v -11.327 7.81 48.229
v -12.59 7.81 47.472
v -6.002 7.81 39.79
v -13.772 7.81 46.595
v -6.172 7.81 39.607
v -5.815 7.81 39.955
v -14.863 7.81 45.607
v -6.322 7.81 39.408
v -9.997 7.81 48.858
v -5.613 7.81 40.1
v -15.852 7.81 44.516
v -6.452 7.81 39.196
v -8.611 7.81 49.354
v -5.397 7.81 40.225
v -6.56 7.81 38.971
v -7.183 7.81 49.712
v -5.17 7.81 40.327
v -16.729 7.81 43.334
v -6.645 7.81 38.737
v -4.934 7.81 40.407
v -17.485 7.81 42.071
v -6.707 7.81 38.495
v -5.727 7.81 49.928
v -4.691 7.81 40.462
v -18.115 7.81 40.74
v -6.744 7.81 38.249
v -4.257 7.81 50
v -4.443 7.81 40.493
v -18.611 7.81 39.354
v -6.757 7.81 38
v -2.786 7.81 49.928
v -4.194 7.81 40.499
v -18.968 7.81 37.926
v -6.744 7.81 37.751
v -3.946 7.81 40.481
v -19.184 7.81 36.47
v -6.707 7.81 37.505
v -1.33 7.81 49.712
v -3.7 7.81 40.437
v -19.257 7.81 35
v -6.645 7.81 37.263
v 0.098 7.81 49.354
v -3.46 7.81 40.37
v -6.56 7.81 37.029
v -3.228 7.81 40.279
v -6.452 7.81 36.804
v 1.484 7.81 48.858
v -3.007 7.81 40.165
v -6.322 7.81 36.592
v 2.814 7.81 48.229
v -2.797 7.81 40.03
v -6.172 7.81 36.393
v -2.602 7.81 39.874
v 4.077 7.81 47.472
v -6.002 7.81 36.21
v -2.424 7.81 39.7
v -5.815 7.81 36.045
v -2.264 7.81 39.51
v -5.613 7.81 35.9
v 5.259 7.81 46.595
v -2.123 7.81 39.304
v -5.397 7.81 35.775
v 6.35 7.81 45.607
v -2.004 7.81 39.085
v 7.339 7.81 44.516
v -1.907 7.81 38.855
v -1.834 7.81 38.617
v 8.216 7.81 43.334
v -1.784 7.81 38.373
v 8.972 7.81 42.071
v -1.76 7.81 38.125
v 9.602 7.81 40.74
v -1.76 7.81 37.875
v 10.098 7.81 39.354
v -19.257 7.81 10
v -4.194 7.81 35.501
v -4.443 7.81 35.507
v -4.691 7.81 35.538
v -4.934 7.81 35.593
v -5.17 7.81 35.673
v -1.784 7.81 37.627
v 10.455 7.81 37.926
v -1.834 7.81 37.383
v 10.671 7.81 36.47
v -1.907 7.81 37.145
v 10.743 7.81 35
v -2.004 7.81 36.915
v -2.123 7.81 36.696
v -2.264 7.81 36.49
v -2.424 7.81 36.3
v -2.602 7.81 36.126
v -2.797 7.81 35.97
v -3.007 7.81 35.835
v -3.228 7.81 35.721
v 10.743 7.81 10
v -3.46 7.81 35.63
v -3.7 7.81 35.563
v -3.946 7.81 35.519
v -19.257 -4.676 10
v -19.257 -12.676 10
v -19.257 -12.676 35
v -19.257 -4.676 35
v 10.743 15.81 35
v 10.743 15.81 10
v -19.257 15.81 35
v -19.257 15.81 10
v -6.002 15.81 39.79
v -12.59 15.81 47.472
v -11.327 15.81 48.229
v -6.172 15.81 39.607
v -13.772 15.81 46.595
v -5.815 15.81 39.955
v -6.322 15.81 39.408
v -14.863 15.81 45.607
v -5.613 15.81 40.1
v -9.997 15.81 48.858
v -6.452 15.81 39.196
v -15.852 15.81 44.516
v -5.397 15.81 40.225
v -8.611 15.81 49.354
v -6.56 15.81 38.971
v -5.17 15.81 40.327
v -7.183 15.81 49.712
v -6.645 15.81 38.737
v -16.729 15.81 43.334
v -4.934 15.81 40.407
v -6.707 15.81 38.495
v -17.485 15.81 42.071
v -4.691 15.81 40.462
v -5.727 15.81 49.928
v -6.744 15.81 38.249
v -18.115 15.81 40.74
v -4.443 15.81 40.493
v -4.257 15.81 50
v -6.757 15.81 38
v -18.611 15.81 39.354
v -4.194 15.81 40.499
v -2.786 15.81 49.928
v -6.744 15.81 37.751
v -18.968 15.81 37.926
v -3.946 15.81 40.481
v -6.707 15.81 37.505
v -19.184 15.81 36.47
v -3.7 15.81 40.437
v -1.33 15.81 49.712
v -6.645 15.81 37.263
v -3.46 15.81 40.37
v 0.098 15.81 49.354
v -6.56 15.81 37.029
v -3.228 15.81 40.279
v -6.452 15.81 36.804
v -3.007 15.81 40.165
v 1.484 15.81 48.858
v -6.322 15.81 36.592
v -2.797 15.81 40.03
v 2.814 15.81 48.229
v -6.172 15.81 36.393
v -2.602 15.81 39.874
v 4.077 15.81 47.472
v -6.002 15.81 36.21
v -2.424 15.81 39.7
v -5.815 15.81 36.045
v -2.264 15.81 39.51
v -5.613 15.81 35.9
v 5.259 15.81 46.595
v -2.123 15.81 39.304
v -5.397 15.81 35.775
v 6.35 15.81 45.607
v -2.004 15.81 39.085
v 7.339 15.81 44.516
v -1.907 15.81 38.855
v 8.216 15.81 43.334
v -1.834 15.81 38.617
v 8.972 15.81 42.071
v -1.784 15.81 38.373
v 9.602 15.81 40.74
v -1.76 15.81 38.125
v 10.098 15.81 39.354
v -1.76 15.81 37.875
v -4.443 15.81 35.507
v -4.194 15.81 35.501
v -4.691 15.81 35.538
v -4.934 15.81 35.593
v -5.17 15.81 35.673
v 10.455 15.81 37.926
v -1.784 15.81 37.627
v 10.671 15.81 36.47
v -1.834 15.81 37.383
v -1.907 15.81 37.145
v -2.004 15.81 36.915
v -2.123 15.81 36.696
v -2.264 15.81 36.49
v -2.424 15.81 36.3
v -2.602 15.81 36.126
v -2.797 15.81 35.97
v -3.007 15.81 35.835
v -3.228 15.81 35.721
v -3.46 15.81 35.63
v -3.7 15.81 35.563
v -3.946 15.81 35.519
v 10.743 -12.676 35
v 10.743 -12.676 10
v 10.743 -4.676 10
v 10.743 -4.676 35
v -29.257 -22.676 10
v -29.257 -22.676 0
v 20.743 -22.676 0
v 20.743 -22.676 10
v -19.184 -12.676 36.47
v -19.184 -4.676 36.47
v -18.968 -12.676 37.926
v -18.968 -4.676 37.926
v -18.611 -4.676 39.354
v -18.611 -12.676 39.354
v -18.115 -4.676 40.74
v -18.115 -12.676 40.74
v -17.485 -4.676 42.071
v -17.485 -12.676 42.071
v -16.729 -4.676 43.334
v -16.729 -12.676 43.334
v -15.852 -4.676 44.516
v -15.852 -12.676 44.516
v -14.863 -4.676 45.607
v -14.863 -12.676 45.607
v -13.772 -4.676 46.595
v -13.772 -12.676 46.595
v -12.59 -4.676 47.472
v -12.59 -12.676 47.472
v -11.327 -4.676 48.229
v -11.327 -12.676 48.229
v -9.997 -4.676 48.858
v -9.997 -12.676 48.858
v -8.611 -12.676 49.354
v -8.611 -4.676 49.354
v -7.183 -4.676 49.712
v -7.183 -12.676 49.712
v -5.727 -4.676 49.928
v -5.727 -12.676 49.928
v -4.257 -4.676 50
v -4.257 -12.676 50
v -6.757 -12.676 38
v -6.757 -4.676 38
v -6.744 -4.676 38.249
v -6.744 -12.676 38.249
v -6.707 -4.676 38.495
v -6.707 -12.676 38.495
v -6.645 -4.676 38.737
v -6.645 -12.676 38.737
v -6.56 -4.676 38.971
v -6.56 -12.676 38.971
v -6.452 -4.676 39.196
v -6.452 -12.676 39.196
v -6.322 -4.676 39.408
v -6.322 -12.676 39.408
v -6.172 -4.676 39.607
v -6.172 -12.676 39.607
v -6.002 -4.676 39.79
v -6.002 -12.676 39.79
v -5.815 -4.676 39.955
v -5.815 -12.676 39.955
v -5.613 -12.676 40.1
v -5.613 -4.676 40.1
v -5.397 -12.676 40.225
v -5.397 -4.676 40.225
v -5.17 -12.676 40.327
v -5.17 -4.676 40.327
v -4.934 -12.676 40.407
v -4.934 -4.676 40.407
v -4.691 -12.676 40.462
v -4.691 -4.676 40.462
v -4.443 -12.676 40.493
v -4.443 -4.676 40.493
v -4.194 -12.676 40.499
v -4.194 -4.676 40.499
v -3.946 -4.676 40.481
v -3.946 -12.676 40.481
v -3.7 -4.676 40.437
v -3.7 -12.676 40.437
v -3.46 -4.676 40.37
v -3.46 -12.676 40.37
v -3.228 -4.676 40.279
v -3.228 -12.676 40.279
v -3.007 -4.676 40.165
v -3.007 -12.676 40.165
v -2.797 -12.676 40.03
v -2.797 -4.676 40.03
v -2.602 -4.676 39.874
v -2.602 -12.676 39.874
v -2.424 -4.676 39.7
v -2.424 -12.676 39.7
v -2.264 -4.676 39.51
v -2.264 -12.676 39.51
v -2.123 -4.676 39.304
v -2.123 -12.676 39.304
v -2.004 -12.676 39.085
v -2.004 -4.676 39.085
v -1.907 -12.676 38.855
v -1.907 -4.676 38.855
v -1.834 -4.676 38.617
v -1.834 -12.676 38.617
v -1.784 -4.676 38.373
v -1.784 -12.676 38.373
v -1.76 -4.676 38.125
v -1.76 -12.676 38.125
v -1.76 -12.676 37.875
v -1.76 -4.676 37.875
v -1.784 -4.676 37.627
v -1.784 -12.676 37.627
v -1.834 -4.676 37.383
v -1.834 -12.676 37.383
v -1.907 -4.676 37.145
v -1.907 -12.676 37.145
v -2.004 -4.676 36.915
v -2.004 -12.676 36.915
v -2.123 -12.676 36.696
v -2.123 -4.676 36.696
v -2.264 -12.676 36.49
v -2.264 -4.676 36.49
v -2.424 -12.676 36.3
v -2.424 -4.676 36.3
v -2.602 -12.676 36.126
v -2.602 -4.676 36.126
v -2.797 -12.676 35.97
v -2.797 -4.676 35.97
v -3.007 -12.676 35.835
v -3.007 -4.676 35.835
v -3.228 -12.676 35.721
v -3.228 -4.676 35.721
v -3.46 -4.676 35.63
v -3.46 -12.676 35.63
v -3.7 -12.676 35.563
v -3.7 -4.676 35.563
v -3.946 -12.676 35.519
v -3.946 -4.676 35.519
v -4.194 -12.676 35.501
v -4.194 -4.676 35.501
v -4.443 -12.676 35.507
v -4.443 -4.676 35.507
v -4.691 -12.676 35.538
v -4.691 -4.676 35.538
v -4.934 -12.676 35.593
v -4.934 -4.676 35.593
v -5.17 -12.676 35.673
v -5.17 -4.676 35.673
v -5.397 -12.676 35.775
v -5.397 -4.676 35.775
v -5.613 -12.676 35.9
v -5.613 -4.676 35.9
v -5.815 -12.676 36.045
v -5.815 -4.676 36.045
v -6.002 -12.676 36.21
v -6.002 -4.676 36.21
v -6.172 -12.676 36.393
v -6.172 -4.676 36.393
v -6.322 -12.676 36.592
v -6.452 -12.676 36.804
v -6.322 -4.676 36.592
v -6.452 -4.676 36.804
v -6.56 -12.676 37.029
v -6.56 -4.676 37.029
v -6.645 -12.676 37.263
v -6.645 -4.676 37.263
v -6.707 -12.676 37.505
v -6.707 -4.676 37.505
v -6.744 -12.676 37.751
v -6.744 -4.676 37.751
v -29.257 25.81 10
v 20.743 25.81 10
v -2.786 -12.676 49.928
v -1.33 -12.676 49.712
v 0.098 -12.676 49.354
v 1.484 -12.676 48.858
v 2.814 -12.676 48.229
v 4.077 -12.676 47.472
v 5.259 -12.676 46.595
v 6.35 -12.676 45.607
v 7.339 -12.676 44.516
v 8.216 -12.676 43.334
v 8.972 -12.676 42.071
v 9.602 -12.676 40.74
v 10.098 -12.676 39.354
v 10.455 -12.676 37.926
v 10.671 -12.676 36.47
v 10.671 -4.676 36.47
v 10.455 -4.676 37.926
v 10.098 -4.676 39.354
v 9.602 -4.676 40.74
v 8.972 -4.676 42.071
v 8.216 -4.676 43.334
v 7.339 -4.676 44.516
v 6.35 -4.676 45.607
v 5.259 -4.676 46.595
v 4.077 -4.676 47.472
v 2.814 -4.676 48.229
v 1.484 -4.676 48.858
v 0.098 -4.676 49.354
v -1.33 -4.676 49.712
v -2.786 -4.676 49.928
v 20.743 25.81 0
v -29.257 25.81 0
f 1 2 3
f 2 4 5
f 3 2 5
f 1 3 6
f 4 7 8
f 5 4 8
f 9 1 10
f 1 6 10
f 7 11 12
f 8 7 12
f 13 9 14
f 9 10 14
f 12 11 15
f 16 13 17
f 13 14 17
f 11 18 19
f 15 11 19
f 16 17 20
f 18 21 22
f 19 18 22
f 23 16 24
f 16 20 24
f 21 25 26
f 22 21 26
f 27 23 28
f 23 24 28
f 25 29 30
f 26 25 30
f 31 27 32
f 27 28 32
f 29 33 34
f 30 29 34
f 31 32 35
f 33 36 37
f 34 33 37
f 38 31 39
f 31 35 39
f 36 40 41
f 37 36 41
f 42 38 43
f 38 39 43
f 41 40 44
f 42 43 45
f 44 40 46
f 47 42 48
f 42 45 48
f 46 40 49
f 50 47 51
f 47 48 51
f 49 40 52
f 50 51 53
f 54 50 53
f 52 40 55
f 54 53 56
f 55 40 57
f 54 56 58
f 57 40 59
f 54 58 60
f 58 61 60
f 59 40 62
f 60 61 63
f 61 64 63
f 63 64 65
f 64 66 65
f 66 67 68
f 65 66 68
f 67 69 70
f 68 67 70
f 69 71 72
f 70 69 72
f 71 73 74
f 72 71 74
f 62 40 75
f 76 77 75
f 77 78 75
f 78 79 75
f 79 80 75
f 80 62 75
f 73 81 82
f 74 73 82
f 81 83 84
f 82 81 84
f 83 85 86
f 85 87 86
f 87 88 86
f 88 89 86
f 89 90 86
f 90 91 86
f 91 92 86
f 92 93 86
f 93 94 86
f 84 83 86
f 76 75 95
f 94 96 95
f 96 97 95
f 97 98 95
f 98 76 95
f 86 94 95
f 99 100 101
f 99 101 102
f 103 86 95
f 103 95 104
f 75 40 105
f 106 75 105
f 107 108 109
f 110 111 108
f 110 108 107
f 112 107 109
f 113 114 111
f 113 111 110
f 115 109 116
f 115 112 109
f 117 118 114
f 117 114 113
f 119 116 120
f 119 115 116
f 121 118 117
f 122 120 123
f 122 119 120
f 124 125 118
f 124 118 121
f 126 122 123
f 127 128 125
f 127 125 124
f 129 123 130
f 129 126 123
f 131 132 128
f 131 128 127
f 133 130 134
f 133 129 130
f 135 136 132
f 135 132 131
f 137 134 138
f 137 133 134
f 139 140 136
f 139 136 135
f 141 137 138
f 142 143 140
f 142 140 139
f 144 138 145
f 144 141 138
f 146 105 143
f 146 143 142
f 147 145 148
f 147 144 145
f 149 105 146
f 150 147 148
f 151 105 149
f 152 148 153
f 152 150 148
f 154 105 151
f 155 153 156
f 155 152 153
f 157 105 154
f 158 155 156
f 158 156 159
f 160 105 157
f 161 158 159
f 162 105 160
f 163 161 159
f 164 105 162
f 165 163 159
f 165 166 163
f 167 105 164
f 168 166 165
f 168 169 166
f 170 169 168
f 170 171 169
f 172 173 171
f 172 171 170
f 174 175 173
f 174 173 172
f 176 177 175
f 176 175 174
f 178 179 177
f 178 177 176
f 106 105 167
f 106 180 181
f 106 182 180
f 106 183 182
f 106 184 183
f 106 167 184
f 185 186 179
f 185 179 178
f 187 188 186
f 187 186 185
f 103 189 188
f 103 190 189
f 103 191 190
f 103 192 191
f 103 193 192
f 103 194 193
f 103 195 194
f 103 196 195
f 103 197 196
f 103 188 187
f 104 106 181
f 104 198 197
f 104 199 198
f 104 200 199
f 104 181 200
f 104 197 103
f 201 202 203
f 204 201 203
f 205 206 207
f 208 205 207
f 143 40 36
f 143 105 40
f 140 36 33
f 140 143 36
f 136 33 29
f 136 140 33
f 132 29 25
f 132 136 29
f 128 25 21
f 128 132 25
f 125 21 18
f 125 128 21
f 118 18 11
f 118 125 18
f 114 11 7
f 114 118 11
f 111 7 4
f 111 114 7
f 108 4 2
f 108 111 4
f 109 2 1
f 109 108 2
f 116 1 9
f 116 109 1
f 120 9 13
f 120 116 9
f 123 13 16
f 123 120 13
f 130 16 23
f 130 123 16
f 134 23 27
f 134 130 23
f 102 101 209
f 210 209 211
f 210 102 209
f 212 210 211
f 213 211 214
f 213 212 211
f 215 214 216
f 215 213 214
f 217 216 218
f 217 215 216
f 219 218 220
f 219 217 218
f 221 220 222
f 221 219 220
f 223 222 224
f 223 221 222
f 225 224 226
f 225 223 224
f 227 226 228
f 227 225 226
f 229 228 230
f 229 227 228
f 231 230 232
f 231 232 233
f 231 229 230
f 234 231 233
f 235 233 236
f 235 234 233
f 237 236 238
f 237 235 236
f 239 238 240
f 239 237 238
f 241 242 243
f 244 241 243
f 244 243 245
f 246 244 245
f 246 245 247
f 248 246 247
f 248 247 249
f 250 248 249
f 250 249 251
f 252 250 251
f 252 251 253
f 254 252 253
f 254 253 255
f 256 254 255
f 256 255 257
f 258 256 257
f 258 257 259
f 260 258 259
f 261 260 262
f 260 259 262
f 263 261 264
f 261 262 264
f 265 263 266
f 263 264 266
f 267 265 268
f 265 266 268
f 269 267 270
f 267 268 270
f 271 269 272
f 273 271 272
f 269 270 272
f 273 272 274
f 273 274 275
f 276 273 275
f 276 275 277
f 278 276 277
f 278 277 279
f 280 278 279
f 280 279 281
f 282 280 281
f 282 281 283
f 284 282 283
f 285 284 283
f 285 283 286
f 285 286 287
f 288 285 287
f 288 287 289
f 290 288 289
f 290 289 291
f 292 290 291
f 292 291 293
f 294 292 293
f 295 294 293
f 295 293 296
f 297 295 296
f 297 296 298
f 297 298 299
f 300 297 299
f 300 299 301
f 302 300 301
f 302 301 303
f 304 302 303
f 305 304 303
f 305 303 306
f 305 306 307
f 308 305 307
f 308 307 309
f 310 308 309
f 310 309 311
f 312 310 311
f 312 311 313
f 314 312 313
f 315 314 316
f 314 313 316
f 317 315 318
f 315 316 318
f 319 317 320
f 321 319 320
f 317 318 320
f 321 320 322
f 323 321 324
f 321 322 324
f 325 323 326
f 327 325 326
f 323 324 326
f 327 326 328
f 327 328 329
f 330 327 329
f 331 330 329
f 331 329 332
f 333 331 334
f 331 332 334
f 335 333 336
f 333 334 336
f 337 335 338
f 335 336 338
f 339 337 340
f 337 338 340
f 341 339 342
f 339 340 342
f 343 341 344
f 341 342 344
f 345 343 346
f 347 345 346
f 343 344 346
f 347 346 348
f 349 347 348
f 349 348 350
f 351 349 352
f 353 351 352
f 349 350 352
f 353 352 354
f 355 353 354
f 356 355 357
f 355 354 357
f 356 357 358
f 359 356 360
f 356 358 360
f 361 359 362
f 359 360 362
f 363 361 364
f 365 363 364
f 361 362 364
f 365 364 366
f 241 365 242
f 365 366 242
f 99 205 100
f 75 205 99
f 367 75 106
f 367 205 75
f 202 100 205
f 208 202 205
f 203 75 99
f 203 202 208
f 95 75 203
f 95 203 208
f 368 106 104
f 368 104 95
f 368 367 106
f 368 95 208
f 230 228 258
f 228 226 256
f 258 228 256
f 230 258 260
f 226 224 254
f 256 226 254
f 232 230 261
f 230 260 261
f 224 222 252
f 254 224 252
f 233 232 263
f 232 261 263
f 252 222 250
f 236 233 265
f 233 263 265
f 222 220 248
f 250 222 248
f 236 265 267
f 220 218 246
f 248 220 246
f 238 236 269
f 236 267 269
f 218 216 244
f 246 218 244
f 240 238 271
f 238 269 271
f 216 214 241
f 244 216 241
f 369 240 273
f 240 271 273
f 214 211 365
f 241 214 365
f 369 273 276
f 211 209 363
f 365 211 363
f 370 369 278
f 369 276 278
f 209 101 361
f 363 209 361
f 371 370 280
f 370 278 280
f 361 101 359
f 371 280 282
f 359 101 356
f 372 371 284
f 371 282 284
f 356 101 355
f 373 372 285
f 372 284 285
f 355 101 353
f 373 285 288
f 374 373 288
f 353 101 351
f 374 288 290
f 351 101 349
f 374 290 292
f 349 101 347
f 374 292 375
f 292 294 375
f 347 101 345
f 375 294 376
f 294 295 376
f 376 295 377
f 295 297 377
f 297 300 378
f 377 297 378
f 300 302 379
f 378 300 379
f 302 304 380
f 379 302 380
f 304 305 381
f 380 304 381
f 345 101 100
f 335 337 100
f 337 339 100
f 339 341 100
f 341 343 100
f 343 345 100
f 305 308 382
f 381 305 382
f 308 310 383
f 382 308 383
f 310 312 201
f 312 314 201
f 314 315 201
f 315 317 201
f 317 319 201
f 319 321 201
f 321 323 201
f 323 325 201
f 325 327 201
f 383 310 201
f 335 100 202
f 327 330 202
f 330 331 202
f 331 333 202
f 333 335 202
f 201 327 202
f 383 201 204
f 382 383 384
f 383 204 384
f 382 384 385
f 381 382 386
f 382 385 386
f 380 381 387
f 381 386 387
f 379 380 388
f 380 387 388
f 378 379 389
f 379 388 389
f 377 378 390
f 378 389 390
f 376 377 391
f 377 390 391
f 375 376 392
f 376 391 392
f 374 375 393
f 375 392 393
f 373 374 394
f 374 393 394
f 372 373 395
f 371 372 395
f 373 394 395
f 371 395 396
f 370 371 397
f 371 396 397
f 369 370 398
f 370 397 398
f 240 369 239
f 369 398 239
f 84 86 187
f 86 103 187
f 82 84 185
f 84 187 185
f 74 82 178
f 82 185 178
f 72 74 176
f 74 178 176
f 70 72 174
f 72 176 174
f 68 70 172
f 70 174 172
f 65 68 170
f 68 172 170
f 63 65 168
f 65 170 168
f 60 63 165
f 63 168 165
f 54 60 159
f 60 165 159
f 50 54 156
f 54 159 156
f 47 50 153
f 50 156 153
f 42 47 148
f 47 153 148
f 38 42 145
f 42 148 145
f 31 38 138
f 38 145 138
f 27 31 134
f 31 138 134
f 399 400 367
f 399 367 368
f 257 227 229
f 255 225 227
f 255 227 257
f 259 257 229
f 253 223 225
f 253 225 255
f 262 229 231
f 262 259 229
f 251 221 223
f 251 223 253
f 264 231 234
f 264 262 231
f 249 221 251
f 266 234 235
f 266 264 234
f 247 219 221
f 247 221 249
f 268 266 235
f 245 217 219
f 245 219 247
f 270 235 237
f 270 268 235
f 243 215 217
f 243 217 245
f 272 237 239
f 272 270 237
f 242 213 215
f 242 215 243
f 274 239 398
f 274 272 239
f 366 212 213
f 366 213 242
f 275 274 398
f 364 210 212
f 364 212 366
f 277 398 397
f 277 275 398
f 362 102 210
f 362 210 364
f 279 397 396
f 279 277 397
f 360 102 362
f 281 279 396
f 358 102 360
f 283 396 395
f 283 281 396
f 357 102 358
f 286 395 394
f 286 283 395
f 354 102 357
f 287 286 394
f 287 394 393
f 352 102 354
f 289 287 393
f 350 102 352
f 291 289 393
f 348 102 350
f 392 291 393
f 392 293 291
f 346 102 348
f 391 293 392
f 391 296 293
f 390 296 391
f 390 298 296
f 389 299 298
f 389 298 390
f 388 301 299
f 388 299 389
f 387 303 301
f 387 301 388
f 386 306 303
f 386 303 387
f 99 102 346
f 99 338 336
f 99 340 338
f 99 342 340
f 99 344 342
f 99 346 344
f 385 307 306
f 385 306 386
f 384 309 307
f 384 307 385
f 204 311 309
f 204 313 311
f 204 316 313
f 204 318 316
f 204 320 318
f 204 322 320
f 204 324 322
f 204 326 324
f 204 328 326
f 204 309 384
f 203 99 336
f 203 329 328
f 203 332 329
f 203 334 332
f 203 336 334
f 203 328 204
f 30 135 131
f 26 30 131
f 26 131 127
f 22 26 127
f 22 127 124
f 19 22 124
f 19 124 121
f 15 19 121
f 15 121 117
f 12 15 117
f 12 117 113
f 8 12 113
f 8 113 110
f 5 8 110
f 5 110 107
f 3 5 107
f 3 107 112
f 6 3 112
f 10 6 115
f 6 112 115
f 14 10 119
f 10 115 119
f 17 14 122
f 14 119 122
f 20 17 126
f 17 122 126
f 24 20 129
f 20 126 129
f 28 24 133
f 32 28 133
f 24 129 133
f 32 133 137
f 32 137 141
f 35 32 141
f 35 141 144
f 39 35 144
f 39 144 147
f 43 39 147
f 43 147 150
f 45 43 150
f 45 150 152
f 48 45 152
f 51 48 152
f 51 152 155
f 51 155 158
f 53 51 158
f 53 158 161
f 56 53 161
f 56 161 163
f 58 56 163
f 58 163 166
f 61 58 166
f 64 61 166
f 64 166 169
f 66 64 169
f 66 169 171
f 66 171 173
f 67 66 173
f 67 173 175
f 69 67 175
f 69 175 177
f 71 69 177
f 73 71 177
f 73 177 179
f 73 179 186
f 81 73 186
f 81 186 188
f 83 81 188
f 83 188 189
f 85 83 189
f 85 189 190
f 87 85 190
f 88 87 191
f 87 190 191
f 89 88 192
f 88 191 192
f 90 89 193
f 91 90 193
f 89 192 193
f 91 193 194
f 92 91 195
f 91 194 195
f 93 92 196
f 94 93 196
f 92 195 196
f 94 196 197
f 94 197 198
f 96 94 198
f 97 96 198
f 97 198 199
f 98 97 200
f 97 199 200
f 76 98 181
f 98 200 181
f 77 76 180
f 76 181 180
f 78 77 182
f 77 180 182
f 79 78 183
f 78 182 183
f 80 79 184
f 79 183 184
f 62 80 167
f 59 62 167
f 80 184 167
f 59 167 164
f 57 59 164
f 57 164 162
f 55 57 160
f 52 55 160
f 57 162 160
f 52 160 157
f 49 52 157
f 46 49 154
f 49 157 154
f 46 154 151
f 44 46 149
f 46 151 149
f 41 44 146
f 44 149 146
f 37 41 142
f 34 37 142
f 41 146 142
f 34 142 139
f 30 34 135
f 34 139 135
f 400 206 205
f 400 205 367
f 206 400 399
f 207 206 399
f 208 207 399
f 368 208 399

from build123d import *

# Parameters (mm, degrees)
F0_W     = 50
F0_H     = 48.4855457247
F1_DEPTH = 10
F2_W     = 30
F2_H     = 8
F4_DEPTH = 40
F3_W     = 30
F3_H     = 8
F5_DEPTH = 40
F7_D     = 5
F8_R     = 14.99999


# Not quite as in the source:
# - a fillet or chamfer is up to 0.001 mm smaller than in the source, because OpenCascade refuses the exact size


with BuildPart() as f1:
    # F0 (on Top) → F1 (new body)
    with BuildSketch(Plane.XY):
        with Locations((-4.2565334588, 1.5670973808)):
            Rectangle(F0_W, F0_H)
    extrude(amount=F1_DEPTH)

    # F2 (on face) → F4 (join)
    with BuildSketch(Plane.XY.offset(10)):
        with Locations((-4.2565334588, 11.8098702431)):
            Rectangle(F2_W, F2_H)
    extrude(amount=F4_DEPTH)

    # F3 (on face) → F5 (join)
    with BuildSketch(Plane.XY.offset(10)):
        with Locations((-4.2565334588, -8.6756754816)):
            Rectangle(F3_W, F3_H)
    extrude(amount=F5_DEPTH)

    # F7 (through all)
    with Locations(Plane.XZ.offset(12.6756754816)):
        with Locations((-4.2565334588, 38)):
            Hole(F7_D / 2)

    # F8 (radius 15 in the source; OpenCascade refuses exactly that, so slightly less here)
    f8_edges = [f1.edges().sort_by_distance(p)[0] for p in [
        (10.743467, -8.675675, 50),
        (-19.256533, -8.675675, 50),
        (10.743467, 11.80987, 50),
        (-19.256533, 11.80987, 50),
    ]]
    fillet(f8_edges, radius=F8_R)


solid = f1.part
